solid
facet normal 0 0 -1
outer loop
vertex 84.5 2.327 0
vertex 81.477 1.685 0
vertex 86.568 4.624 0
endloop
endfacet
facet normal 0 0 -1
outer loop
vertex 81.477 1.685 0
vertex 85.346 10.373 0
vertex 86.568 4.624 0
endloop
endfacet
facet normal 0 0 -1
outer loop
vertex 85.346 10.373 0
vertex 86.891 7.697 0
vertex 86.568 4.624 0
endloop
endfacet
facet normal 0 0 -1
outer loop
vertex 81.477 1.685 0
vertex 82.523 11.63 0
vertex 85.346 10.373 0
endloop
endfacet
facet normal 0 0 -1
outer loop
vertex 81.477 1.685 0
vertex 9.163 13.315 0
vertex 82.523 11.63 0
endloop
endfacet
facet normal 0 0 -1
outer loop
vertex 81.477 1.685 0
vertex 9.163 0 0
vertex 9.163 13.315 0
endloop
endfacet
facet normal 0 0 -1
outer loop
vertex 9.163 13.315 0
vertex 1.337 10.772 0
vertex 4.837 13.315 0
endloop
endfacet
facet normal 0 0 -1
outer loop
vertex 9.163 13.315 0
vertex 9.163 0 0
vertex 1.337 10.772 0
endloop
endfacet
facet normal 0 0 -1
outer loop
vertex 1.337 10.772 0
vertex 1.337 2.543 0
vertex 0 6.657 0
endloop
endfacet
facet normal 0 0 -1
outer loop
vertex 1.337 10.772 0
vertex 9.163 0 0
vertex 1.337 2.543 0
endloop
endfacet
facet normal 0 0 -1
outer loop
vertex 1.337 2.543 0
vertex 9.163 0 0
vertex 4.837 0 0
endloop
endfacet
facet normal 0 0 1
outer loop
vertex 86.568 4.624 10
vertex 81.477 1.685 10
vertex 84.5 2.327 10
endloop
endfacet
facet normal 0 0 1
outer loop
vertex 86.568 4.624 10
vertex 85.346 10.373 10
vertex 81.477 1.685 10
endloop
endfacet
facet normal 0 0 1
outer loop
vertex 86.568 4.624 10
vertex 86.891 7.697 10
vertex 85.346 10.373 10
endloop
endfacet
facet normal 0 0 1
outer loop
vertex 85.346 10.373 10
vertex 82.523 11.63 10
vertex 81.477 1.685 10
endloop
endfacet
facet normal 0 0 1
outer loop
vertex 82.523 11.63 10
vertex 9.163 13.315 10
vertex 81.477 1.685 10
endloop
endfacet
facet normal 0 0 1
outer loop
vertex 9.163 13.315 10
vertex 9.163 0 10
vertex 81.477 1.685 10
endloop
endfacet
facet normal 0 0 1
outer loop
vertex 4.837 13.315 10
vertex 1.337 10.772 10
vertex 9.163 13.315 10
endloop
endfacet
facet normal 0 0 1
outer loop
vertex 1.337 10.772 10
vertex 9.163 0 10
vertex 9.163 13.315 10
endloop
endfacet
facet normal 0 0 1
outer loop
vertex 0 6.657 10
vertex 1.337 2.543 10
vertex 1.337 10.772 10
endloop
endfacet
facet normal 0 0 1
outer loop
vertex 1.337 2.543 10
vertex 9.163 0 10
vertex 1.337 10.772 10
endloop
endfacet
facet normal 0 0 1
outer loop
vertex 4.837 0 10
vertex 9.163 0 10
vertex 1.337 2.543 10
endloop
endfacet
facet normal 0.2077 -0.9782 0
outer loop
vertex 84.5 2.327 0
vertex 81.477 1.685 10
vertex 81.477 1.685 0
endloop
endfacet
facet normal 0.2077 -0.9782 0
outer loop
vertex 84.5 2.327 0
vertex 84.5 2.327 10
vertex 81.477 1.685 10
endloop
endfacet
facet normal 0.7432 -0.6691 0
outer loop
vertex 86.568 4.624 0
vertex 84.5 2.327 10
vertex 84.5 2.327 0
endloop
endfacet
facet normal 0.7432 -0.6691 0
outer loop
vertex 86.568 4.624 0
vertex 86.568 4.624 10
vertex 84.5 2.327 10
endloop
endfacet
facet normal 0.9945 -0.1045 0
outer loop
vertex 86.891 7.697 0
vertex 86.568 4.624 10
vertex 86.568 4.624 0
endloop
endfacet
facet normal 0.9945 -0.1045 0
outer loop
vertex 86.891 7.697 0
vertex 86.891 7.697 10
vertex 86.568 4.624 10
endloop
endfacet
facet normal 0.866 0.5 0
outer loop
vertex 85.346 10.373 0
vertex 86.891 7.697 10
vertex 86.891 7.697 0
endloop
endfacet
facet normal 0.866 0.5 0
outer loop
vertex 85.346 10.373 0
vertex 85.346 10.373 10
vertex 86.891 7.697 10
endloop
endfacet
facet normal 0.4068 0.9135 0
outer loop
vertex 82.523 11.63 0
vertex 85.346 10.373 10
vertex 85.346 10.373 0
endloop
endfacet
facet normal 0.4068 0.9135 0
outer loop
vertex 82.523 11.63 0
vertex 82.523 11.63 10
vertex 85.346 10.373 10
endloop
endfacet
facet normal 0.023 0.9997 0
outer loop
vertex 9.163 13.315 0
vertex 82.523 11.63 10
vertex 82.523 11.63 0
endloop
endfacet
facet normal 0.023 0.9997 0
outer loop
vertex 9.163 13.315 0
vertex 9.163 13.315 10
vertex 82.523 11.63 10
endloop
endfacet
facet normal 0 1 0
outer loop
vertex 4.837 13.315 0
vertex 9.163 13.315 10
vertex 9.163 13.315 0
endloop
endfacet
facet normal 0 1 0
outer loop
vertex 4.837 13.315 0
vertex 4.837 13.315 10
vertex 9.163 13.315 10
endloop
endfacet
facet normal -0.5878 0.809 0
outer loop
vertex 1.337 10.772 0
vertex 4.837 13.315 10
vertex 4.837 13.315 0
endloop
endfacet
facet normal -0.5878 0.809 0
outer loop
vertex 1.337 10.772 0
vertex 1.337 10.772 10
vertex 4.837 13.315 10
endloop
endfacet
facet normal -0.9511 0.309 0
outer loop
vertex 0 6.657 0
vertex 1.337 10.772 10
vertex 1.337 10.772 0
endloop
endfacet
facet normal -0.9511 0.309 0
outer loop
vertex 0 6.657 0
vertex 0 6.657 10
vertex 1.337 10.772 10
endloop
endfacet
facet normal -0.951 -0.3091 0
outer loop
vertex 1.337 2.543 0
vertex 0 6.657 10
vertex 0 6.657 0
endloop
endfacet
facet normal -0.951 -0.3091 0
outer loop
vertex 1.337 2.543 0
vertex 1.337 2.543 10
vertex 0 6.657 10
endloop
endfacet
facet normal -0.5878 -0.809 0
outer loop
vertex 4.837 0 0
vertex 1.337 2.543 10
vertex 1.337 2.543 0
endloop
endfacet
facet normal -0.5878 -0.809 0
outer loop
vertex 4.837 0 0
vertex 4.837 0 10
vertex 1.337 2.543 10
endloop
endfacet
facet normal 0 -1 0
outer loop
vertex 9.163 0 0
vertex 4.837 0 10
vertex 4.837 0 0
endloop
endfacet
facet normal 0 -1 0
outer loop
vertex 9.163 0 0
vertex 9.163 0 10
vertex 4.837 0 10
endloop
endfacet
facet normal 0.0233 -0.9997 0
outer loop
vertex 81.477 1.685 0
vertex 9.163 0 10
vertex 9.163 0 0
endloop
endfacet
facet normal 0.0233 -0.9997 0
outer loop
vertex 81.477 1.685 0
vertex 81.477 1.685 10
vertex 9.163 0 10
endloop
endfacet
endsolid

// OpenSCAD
$fn = 32;

// ----------------------------------------------------------------------
// Lever arm: two bosses 14 and 10 mm, 75 mm between centres
// ----------------------------------------------------------------------

// --- parameters (mm) ---
profile_height = 10;      // extrusion height
profile_points = 13;      // points of the closed outline

profile = [[0, 6.657], [1.337, 2.543], [4.837, 0], [9.163, 0], [81.477, 1.685], [84.5, 2.327], [86.568, 4.624], [86.891, 7.697], [85.346, 10.373], [82.523, 11.63], [9.163, 13.315], [4.837, 13.315], [1.337, 10.772]];  // single closed polygon, 13 points, counter clockwise

// --- the one profile operation ---
linear_extrude(height = profile_height) polygon(points = profile);
